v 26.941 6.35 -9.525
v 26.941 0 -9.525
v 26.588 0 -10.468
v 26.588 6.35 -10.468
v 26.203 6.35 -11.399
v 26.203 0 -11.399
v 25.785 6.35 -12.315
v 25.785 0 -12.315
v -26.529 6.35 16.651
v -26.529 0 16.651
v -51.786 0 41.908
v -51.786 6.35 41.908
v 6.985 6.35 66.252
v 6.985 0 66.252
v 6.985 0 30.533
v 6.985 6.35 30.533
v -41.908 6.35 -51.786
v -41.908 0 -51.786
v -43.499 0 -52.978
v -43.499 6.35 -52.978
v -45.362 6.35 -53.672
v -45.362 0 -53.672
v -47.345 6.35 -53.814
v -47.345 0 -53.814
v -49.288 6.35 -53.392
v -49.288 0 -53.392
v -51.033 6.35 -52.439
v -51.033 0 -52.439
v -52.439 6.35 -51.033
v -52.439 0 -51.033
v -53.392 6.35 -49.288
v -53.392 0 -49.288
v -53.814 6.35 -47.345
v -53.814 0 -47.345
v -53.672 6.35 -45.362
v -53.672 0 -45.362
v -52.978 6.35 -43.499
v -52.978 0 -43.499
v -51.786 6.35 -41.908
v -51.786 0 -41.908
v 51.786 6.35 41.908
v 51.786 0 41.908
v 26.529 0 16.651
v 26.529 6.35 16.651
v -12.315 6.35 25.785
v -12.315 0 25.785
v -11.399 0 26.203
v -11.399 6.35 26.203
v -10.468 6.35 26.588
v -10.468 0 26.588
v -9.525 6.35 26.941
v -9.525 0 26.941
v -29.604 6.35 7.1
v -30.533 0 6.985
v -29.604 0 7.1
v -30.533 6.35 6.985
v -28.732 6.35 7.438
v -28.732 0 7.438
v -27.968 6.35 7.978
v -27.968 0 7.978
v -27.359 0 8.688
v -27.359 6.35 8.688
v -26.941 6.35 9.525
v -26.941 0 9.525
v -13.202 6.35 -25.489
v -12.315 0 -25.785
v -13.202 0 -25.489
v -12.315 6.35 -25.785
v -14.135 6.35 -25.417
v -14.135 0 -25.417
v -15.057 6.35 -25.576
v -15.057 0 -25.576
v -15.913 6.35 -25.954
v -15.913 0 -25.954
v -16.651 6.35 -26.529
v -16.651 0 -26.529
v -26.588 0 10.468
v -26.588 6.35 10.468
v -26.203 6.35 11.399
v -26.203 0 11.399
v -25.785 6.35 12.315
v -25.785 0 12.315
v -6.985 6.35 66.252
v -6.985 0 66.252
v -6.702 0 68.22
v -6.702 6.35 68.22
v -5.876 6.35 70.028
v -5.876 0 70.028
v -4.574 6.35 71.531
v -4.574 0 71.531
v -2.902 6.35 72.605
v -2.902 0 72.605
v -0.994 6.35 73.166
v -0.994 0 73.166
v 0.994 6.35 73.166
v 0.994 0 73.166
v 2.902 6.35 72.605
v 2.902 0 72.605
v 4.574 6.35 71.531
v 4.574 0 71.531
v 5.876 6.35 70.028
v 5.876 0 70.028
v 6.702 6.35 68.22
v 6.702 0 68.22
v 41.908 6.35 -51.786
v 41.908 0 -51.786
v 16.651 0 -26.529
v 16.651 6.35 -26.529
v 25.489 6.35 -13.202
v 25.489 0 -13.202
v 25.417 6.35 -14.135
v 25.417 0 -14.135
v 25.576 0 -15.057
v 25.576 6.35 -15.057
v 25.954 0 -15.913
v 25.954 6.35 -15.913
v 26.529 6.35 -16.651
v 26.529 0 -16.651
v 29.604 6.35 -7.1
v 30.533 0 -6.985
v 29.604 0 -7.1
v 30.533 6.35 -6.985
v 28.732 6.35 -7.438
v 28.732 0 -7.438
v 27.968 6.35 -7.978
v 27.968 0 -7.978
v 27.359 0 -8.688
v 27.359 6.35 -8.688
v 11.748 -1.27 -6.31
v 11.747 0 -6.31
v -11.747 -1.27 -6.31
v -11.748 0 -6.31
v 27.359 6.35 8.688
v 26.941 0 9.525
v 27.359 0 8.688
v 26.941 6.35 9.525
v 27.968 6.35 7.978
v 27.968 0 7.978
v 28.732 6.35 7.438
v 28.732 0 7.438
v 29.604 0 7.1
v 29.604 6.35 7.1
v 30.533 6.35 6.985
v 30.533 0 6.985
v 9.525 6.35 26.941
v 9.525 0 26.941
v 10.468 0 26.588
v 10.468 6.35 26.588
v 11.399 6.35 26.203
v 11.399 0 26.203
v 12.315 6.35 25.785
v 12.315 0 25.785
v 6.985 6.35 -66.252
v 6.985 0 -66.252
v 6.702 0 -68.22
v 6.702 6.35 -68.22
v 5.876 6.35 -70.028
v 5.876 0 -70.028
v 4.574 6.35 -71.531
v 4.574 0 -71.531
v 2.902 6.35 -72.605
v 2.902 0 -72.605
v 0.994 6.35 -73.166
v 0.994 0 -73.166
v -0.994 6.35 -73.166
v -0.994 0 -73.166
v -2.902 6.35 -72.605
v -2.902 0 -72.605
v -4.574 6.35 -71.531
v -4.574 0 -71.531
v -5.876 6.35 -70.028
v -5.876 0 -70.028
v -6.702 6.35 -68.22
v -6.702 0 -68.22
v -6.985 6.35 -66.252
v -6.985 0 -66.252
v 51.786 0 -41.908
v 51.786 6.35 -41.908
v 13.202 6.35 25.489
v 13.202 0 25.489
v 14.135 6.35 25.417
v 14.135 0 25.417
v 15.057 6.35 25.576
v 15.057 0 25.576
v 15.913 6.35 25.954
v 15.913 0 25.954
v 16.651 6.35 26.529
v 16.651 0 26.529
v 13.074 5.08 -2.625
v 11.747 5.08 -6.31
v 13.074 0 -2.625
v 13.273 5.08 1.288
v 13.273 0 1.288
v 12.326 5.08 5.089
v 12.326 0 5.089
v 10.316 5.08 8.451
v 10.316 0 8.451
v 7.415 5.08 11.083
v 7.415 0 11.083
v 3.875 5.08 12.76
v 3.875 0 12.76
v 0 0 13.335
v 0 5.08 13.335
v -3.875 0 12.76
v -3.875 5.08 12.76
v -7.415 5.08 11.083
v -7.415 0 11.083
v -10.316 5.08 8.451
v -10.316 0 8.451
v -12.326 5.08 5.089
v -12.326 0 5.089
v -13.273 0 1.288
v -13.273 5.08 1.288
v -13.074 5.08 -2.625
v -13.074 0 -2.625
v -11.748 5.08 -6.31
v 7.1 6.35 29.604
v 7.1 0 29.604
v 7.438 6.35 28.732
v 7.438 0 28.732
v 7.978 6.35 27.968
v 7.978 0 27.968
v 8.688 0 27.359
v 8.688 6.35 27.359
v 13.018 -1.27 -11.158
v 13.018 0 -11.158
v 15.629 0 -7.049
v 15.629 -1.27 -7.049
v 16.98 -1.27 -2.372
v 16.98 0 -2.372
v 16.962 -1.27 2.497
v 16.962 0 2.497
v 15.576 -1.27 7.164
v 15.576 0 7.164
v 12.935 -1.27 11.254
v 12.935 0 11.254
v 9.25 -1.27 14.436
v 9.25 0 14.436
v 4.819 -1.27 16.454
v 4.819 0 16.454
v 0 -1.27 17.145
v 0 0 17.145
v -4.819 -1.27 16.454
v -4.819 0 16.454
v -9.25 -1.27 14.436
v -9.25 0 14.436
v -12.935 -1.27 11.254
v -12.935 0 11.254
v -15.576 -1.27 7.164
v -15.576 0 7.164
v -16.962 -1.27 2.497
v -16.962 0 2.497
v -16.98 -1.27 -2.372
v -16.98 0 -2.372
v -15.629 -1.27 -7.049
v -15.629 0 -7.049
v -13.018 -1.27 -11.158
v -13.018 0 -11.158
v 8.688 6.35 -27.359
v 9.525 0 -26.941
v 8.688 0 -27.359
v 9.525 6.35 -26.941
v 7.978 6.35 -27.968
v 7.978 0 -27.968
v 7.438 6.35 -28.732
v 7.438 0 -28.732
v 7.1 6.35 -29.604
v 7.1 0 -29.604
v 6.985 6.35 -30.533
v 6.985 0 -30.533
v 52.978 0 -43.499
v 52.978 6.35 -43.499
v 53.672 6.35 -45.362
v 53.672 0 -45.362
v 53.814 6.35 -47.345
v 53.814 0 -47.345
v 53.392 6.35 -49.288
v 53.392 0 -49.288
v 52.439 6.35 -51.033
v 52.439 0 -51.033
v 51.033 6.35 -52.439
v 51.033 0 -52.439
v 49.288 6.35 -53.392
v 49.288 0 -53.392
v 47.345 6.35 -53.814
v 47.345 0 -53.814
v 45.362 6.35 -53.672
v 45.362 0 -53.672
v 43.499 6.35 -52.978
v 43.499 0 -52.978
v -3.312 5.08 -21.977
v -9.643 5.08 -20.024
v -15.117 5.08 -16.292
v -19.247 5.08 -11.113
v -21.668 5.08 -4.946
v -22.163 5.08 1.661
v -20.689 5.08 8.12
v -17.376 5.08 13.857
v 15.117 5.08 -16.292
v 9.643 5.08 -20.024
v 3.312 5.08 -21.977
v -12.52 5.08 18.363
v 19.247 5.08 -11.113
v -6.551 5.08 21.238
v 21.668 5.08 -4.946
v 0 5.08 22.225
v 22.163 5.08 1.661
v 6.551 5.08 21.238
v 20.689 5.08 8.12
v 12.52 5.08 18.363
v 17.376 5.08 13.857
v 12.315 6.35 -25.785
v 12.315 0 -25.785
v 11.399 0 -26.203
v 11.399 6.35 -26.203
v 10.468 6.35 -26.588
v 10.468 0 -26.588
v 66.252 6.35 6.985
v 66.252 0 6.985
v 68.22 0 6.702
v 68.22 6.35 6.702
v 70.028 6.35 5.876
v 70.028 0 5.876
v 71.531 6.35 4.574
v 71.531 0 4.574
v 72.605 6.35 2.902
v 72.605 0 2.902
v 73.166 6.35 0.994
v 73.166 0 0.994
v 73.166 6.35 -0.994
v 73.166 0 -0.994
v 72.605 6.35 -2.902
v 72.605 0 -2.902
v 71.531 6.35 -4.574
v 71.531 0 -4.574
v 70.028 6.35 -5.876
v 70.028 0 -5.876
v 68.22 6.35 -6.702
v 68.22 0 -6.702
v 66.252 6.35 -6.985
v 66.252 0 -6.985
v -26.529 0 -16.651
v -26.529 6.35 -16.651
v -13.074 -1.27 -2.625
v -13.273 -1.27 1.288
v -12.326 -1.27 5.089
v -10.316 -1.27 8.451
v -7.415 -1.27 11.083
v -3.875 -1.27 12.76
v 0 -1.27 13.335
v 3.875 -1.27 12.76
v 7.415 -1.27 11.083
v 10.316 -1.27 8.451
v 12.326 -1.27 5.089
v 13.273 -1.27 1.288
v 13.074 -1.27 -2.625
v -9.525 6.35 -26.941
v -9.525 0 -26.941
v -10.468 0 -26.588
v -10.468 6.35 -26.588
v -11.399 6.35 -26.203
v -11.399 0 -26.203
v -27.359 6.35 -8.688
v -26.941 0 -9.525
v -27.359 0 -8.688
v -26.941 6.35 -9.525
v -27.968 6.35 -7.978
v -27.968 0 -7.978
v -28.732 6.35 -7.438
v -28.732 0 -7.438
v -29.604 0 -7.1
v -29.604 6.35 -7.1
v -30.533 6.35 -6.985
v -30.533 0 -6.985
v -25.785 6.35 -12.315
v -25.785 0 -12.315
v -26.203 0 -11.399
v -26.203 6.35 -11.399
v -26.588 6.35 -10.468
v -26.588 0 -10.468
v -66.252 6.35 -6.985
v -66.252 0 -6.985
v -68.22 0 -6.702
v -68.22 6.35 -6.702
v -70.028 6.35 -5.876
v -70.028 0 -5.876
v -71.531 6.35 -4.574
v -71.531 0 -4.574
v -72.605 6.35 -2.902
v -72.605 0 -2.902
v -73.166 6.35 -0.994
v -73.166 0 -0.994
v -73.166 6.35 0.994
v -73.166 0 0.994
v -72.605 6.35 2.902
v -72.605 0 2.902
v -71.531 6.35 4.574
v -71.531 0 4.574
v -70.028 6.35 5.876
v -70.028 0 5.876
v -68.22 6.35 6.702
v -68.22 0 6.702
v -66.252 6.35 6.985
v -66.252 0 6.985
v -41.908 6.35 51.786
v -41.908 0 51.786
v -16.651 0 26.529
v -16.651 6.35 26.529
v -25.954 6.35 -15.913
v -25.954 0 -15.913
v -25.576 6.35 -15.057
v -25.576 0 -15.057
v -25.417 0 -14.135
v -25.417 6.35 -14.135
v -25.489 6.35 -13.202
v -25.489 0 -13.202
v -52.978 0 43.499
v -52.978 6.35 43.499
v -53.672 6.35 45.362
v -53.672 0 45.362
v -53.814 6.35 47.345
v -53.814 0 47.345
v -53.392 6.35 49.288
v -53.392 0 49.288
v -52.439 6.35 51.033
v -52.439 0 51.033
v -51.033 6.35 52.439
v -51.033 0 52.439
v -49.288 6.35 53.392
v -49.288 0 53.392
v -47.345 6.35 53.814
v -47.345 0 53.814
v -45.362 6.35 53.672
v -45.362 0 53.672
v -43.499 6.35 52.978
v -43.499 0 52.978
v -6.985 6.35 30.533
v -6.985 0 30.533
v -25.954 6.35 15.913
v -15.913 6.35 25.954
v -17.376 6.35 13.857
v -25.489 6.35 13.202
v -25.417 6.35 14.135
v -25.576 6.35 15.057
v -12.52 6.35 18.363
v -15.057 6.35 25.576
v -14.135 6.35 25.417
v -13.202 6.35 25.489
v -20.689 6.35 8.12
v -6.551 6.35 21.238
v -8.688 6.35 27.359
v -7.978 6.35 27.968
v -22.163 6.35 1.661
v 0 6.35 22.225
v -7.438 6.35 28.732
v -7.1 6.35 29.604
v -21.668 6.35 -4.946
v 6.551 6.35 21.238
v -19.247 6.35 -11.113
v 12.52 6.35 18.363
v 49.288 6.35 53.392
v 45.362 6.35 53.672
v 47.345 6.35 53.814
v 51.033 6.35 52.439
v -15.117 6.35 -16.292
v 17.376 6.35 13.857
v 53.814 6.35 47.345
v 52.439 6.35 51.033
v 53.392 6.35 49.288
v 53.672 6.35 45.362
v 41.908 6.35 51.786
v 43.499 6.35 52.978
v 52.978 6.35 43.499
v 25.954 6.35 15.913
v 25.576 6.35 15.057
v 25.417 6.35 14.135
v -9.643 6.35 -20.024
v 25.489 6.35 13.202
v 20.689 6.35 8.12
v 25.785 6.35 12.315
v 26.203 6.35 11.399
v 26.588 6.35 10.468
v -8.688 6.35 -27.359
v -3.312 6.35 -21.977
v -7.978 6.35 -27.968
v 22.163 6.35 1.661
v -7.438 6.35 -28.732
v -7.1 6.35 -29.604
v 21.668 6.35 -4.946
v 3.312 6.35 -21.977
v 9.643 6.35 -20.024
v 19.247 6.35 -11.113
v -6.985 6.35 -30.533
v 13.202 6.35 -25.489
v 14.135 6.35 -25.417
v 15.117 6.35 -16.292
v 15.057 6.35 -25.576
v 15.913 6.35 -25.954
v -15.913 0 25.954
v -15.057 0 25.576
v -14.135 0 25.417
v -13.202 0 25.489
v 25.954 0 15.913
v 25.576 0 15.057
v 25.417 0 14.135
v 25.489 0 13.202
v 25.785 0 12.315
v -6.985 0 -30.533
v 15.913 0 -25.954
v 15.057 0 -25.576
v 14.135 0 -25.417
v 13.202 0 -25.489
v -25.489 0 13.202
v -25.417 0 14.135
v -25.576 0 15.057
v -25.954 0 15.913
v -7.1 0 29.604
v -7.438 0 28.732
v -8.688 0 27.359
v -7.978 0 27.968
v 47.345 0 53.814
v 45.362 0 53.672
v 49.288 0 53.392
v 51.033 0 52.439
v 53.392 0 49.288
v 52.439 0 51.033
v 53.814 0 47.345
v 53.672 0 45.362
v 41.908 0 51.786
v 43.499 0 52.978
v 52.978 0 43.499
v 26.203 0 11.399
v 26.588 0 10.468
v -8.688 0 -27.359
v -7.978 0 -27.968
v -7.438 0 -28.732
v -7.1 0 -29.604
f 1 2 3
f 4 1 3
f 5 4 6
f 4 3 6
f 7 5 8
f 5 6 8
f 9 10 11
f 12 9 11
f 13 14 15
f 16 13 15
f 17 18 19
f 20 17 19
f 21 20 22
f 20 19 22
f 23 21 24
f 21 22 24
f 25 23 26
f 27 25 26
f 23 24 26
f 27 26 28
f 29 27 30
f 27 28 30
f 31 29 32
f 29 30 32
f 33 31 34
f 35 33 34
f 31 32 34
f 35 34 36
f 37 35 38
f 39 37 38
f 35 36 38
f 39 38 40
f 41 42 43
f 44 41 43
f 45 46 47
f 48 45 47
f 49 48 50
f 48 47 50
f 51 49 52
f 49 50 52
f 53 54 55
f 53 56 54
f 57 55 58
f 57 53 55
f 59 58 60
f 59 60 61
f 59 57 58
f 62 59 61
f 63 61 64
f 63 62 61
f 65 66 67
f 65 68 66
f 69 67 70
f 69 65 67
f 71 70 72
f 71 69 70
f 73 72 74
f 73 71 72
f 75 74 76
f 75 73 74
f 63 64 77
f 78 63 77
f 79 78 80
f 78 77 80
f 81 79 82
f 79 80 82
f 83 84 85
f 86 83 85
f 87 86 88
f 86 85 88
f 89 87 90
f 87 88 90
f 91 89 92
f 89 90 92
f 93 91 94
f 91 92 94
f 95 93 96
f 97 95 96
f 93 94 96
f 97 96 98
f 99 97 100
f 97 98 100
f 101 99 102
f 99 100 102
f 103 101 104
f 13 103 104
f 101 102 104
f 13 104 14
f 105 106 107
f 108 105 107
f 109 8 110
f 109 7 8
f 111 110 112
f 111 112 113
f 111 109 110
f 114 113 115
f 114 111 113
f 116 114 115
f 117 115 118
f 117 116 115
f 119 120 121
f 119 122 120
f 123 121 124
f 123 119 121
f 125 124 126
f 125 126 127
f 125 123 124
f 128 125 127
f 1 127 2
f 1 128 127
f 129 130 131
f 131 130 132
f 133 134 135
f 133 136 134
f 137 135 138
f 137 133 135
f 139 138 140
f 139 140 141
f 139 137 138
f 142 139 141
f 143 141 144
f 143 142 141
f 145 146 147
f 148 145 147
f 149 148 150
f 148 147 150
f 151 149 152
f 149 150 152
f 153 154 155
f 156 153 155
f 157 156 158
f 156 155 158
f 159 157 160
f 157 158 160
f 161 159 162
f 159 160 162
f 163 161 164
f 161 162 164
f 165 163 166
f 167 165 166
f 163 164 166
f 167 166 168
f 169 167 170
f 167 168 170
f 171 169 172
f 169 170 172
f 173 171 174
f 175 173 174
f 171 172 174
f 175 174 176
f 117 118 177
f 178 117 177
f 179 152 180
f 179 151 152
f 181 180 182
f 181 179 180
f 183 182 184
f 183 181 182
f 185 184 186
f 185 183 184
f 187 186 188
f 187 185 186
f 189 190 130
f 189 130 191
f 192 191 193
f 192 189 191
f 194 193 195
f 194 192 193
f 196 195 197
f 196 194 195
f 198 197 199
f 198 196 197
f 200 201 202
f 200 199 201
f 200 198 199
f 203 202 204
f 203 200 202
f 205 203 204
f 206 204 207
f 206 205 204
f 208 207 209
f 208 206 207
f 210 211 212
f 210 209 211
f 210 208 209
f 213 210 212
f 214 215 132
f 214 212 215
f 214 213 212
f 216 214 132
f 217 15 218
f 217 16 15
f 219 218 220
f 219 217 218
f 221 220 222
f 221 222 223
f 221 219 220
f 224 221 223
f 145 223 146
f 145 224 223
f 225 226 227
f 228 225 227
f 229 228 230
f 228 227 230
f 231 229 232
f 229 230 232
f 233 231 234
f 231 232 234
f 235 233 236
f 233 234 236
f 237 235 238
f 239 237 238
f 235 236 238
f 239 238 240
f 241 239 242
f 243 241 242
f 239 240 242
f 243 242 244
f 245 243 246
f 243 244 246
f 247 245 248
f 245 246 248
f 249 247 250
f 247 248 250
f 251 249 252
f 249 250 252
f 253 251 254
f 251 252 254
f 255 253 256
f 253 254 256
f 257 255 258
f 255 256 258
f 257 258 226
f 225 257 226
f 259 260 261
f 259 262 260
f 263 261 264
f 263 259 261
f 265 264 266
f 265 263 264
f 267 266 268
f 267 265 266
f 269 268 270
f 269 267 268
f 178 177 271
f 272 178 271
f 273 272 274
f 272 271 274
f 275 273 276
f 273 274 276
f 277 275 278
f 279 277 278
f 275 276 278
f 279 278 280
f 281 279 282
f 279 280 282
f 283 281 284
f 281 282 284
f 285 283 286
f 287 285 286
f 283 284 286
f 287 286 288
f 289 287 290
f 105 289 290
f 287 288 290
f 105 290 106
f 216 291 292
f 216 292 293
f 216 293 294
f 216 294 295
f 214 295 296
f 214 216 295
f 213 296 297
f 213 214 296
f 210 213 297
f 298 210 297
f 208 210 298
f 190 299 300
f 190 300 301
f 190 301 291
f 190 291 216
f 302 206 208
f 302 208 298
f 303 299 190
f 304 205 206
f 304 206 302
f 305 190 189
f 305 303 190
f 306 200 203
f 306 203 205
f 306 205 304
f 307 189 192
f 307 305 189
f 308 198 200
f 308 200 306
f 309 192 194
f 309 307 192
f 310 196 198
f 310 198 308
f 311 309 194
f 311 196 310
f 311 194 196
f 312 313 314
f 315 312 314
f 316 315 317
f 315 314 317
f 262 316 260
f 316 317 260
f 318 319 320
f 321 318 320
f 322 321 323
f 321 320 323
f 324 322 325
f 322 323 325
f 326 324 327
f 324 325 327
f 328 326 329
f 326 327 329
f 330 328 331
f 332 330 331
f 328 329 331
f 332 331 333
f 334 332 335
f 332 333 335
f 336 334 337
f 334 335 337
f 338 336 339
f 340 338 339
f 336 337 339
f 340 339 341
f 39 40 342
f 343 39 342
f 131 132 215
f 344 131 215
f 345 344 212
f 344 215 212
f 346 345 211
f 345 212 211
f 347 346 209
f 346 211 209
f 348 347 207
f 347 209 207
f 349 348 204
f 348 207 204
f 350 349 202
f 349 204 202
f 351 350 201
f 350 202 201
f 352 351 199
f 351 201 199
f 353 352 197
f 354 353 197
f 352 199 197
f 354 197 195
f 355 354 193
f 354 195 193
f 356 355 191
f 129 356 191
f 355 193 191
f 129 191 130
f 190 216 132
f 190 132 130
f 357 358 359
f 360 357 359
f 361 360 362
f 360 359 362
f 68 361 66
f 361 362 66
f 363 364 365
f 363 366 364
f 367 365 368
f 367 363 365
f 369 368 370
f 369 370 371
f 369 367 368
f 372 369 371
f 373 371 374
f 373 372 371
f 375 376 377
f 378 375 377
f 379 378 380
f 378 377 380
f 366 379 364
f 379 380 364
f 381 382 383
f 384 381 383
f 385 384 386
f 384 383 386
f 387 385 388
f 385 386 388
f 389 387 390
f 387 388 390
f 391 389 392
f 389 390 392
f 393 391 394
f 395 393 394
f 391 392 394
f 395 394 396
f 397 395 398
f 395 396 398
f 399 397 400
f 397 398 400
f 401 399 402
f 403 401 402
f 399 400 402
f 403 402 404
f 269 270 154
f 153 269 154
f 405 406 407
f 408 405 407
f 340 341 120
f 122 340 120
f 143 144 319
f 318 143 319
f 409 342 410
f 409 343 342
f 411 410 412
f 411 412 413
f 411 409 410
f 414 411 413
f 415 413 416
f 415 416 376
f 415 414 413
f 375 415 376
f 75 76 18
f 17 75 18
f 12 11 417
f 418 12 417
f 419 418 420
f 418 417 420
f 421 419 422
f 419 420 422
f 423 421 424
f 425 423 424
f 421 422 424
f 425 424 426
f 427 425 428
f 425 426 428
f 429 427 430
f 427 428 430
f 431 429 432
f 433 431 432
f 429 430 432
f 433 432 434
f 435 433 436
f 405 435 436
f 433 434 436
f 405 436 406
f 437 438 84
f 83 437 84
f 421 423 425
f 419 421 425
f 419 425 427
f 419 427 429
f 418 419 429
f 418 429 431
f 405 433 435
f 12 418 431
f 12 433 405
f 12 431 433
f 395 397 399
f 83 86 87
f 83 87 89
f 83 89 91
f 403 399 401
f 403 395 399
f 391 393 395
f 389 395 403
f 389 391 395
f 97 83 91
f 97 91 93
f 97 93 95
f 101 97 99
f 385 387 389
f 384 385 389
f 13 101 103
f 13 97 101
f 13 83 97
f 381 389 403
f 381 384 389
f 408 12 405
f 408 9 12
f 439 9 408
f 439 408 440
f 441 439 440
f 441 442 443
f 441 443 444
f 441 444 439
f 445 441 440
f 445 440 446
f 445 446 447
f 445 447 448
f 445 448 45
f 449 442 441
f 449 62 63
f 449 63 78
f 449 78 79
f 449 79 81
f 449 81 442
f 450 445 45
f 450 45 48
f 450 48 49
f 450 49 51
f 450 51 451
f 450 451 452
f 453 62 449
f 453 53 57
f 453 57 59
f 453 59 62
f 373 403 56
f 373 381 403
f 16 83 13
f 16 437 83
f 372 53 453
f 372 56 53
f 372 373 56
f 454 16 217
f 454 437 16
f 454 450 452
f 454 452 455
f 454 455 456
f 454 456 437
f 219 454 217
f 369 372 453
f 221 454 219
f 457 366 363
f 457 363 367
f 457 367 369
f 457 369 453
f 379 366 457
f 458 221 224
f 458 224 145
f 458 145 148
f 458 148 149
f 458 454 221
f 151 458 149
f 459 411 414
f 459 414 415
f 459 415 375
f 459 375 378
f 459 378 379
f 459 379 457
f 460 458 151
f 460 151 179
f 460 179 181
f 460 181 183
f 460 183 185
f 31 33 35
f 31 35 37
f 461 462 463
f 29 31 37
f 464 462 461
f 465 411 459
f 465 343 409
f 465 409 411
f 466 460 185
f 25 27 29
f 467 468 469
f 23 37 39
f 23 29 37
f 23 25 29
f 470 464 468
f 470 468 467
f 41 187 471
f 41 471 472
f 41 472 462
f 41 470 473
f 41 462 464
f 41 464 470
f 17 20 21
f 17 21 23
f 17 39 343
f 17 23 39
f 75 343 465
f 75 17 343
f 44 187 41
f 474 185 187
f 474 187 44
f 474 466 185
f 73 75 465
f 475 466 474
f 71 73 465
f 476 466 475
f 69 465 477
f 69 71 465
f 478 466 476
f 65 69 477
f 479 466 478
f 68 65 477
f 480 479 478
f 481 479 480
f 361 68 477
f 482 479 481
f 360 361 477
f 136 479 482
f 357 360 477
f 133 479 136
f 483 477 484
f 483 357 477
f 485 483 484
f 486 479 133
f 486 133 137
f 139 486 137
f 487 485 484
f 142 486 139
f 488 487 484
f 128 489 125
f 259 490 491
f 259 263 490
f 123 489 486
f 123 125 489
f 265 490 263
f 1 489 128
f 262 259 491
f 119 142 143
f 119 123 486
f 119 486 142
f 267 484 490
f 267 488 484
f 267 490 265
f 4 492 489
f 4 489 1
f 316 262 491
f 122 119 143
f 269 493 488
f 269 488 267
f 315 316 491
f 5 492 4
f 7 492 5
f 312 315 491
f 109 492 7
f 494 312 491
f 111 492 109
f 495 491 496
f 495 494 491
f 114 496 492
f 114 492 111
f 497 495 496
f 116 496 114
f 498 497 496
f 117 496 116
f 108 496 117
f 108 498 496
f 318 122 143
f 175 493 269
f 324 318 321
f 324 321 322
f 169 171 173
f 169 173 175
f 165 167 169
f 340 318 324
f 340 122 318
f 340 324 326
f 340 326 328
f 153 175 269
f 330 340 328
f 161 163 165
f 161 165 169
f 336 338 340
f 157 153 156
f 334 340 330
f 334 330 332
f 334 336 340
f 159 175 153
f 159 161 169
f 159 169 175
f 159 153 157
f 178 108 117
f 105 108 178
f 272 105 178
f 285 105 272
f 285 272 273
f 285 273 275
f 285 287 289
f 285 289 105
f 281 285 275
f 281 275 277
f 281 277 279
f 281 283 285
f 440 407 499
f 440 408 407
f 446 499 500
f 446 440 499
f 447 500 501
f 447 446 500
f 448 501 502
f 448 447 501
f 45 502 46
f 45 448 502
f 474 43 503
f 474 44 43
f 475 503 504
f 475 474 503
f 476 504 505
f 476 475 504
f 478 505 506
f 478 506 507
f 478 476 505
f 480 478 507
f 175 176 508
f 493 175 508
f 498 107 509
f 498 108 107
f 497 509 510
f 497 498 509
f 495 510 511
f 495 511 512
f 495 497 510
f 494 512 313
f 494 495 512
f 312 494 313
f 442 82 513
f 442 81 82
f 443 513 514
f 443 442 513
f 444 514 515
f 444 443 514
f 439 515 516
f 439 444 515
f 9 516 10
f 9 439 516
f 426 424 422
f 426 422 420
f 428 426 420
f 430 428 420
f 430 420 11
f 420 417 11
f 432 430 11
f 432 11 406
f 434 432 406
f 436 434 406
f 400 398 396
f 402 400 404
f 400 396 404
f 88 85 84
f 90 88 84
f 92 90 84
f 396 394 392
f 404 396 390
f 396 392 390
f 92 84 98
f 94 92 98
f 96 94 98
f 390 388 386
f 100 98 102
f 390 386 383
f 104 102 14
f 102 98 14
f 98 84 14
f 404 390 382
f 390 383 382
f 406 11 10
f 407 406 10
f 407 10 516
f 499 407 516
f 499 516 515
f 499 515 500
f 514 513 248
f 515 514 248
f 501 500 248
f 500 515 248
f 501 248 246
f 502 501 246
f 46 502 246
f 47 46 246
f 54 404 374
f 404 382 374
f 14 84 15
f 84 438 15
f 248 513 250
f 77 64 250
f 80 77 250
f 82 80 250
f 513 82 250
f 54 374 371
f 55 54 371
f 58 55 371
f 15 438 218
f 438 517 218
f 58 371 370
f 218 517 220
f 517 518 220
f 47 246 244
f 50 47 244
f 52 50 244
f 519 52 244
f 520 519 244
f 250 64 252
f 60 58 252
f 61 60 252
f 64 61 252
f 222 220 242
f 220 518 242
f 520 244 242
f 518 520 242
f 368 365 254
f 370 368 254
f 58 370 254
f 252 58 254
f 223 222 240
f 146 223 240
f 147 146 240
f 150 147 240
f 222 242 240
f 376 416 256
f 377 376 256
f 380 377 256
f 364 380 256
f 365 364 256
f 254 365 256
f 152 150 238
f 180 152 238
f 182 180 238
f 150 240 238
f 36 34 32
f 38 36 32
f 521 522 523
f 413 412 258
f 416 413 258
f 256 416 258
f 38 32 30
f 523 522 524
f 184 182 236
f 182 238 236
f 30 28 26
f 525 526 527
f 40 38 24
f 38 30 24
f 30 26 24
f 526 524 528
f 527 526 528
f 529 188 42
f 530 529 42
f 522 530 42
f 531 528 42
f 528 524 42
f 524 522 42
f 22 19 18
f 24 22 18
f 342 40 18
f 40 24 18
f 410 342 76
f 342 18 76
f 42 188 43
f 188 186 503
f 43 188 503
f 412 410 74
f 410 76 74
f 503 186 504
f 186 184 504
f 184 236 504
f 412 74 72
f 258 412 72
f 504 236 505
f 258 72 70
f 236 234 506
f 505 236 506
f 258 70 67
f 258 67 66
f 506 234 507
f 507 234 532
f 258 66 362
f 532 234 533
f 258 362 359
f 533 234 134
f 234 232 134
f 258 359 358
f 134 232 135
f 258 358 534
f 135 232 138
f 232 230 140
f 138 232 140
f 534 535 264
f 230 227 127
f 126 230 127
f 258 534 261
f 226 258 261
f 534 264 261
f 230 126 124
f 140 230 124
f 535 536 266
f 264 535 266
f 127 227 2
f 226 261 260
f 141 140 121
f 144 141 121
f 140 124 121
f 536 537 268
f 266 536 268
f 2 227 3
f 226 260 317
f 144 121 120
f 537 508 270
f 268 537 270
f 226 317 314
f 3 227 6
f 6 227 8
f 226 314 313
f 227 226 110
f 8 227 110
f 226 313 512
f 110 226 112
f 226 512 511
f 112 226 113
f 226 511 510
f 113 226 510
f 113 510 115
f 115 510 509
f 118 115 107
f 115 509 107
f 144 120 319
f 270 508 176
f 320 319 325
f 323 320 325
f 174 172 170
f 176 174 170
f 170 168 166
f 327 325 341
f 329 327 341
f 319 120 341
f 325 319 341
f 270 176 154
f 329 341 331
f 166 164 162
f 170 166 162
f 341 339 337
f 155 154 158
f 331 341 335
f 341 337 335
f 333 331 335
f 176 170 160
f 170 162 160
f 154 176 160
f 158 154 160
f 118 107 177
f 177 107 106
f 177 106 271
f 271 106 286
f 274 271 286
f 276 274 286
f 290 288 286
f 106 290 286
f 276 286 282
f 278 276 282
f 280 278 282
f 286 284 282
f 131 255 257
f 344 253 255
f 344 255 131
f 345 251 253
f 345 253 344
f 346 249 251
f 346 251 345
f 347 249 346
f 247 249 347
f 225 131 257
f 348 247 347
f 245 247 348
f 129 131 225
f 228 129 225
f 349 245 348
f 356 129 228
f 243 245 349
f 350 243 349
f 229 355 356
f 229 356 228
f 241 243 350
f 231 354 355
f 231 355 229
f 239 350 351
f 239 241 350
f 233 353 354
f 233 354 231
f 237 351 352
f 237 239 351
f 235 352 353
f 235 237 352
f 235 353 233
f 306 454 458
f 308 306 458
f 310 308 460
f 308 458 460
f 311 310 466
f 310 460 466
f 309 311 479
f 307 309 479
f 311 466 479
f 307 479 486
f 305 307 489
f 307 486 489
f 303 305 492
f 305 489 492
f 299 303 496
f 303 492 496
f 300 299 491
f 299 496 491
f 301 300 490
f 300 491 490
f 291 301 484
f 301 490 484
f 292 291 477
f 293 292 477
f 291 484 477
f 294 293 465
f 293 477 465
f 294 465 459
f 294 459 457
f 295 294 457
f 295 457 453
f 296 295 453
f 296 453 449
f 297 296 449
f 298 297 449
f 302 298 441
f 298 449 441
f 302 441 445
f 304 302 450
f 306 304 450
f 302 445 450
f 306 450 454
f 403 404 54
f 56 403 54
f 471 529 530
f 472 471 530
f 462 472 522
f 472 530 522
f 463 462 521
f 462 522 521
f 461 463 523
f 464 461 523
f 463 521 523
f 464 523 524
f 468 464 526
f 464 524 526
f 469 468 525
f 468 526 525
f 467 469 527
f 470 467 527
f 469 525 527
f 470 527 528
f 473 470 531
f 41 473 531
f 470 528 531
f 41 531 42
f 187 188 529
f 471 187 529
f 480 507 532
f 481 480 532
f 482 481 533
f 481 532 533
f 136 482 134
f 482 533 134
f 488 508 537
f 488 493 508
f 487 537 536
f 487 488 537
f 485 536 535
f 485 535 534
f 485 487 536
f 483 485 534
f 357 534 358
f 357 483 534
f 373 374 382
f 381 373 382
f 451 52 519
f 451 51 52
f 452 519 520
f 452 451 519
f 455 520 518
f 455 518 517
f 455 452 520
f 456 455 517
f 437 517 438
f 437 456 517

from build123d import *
from build123d.topology import SkipClean

# Parameters (mm, degrees)
BOSS_EXTRUDE1_DEPTH = 6.35
FILLET1_R           = 3.81
SKETCH2_R           = 22.225
CUT_EXTRUDE1_DEPTH  = 1.27
CUT_EXTRUDE2_DEPTH  = 104.696794015
BOSS_EXTRUDE3_DEPTH = 1.27


with BuildPart() as part:
    # Sketch1 → Boss-Extrude1 (new body)
    with BuildSketch(Plane(origin=(0, 0, 0), x_dir=(1, 0, 0), z_dir=(0, 1, 0))):
        with BuildLine():
            Line((-6.985, 66.251666667), (-6.985, 27.708128771))
            ThreePointArc((-6.985, 27.708128771), (-10.93517908, 26.399857642), (-14.653464881, 24.531746615))
            Line((-14.653464881, 24.531746615), (-41.907861898, 51.786143631))
            ThreePointArc((-41.907861898, 51.786143631), (-51.786143631, 51.786143631), (-51.786143631, 41.907861898))
            Line((-51.786143631, 41.907861898), (-24.531746615, 14.653464881))
            ThreePointArc((-24.531746615, 14.653464881), (-26.399857642, 10.93517908), (-27.708128771, 6.985))
            Line((-27.708128771, 6.985), (-66.251666667, 6.985))
            ThreePointArc((-66.251666667, 6.985), (-73.236666667, 0), (-66.251666667, -6.985))
            Line((-66.251666667, -6.985), (-27.708128771, -6.985))
            ThreePointArc((-27.708128771, -6.985), (-26.399857642, -10.93517908), (-24.531746615, -14.653464881))
            Line((-24.531746615, -14.653464881), (-51.786143631, -41.907861898))
            ThreePointArc((-51.786143631, -41.907861898), (-51.786143631, -51.786143631), (-41.907861898, -51.786143631))
            Line((-41.907861898, -51.786143631), (-14.653464881, -24.531746615))
            ThreePointArc((-14.653464881, -24.531746615), (-10.93517908, -26.399857642), (-6.985, -27.708128771))
            Line((-6.985, -27.708128771), (-6.985, -66.251666667))
            ThreePointArc((-6.985, -66.251666667), (0, -73.236666667), (6.985, -66.251666667))
            Line((6.985, -66.251666667), (6.985, -27.708128771))
            ThreePointArc((6.985, -27.708128771), (10.93517908, -26.399857642), (14.653464881, -24.531746615))
            Line((14.653464881, -24.531746615), (41.907861898, -51.786143631))
            ThreePointArc((41.907861898, -51.786143631), (51.786143631, -51.786143631), (51.786143631, -41.907861898))
            Line((51.786143631, -41.907861898), (24.531746615, -14.653464881))
            ThreePointArc((24.531746615, -14.653464881), (26.399857642, -10.93517908), (27.708128771, -6.985))
            Line((27.708128771, -6.985), (66.251666667, -6.985))
            ThreePointArc((66.251666667, -6.985), (73.236666667, 0), (66.251666667, 6.985))
            Line((66.251666667, 6.985), (27.708128771, 6.985))
            ThreePointArc((27.708128771, 6.985), (26.399857642, 10.93517908), (24.531746615, 14.653464881))
            Line((24.531746615, 14.653464881), (51.786143631, 41.907861898))
            ThreePointArc((51.786143631, 41.907861898), (51.786143631, 51.786143631), (41.907861898, 51.786143631))
            Line((41.907861898, 51.786143631), (14.653464881, 24.531746615))
            ThreePointArc((14.653464881, 24.531746615), (10.93517908, 26.399857642), (6.985, 27.708128771))
            Line((6.985, 27.708128771), (6.985, 66.251666667))
            ThreePointArc((6.985, 66.251666667), (0, 73.236666667), (-6.985, 66.251666667))
        make_face()
    extrude(amount=BOSS_EXTRUDE1_DEPTH)

    # Fillet1
    fillet1_edges = [part.edges().sort_by_distance(p)[0] for p in [
        (6.985, 3.175, -27.708128771),
        (14.653464881, 3.175, -24.531746615),
        (24.531746615, 3.175, -14.653464881),
        (27.708128771, 3.175, -6.985),
        (27.708128771, 3.175, 6.985),
        (24.531746615, 3.175, 14.653464881),
        (14.653464881, 3.175, 24.531746615),
        (6.985, 3.175, 27.708128771),
        (-6.985, 3.175, 27.708128771),
        (-14.653464881, 3.175, 24.531746615),
        (-24.531746615, 3.175, 14.653464881),
        (-27.708128771, 3.175, 6.985),
        (-27.708128771, 3.175, -6.985),
        (-24.531746615, 3.175, -14.653464881),
        (-14.653464881, 3.175, -24.531746615),
        (-6.985, 3.175, -27.708128771),
    ]]
    fillet(fillet1_edges, radius=FILLET1_R)

    # Sketch2 → Cut-Extrude1 (cut)
    with BuildSketch(Plane(origin=(0, 6.35, 0), x_dir=(1, 0, 0), z_dir=(0, 1, 0))):
        with Locations(Location((0, 0, 0), (0, 0, 270))):
            Circle(SKETCH2_R)
    extrude(amount=-CUT_EXTRUDE1_DEPTH, mode=Mode.SUBTRACT)

    # Sketch3 → Cut-Extrude2 (cut, through all)
    with BuildSketch(Plane(origin=(0, 5.08, 0), x_dir=(1, 0, 0), z_dir=(0, 1, 0))):
        with BuildLine():
            Line((-11.7475, 6.310187695), (11.7475, 6.310187695))
            ThreePointArc((11.7475, 6.310187695), (0, -13.335), (-11.7475, 6.310187695))
        make_face()
    extrude(amount=-CUT_EXTRUDE2_DEPTH, mode=Mode.SUBTRACT)

    # Sketch4 → Boss-Extrude3 (add)
    with SkipClean():  # the faces are left unmerged after this step: merging them gives an invalid solid
        with BuildSketch(Plane.XZ):
            with BuildLine():
                Line((-13.0175, -11.157764953), (13.0175, -11.157764953))
                ThreePointArc((13.0175, -11.157764953), (0, 17.145), (-13.0175, -11.157764953))
            make_face()
            with BuildLine():
                Line((11.7475, -6.310187695), (-11.7475, -6.310187695))
                ThreePointArc((-11.7475, -6.310187695), (0, 13.335), (11.7475, -6.310187695))
            make_face(mode=Mode.SUBTRACT)
        extrude(amount=BOSS_EXTRUDE3_DEPTH)


solid = part.part
